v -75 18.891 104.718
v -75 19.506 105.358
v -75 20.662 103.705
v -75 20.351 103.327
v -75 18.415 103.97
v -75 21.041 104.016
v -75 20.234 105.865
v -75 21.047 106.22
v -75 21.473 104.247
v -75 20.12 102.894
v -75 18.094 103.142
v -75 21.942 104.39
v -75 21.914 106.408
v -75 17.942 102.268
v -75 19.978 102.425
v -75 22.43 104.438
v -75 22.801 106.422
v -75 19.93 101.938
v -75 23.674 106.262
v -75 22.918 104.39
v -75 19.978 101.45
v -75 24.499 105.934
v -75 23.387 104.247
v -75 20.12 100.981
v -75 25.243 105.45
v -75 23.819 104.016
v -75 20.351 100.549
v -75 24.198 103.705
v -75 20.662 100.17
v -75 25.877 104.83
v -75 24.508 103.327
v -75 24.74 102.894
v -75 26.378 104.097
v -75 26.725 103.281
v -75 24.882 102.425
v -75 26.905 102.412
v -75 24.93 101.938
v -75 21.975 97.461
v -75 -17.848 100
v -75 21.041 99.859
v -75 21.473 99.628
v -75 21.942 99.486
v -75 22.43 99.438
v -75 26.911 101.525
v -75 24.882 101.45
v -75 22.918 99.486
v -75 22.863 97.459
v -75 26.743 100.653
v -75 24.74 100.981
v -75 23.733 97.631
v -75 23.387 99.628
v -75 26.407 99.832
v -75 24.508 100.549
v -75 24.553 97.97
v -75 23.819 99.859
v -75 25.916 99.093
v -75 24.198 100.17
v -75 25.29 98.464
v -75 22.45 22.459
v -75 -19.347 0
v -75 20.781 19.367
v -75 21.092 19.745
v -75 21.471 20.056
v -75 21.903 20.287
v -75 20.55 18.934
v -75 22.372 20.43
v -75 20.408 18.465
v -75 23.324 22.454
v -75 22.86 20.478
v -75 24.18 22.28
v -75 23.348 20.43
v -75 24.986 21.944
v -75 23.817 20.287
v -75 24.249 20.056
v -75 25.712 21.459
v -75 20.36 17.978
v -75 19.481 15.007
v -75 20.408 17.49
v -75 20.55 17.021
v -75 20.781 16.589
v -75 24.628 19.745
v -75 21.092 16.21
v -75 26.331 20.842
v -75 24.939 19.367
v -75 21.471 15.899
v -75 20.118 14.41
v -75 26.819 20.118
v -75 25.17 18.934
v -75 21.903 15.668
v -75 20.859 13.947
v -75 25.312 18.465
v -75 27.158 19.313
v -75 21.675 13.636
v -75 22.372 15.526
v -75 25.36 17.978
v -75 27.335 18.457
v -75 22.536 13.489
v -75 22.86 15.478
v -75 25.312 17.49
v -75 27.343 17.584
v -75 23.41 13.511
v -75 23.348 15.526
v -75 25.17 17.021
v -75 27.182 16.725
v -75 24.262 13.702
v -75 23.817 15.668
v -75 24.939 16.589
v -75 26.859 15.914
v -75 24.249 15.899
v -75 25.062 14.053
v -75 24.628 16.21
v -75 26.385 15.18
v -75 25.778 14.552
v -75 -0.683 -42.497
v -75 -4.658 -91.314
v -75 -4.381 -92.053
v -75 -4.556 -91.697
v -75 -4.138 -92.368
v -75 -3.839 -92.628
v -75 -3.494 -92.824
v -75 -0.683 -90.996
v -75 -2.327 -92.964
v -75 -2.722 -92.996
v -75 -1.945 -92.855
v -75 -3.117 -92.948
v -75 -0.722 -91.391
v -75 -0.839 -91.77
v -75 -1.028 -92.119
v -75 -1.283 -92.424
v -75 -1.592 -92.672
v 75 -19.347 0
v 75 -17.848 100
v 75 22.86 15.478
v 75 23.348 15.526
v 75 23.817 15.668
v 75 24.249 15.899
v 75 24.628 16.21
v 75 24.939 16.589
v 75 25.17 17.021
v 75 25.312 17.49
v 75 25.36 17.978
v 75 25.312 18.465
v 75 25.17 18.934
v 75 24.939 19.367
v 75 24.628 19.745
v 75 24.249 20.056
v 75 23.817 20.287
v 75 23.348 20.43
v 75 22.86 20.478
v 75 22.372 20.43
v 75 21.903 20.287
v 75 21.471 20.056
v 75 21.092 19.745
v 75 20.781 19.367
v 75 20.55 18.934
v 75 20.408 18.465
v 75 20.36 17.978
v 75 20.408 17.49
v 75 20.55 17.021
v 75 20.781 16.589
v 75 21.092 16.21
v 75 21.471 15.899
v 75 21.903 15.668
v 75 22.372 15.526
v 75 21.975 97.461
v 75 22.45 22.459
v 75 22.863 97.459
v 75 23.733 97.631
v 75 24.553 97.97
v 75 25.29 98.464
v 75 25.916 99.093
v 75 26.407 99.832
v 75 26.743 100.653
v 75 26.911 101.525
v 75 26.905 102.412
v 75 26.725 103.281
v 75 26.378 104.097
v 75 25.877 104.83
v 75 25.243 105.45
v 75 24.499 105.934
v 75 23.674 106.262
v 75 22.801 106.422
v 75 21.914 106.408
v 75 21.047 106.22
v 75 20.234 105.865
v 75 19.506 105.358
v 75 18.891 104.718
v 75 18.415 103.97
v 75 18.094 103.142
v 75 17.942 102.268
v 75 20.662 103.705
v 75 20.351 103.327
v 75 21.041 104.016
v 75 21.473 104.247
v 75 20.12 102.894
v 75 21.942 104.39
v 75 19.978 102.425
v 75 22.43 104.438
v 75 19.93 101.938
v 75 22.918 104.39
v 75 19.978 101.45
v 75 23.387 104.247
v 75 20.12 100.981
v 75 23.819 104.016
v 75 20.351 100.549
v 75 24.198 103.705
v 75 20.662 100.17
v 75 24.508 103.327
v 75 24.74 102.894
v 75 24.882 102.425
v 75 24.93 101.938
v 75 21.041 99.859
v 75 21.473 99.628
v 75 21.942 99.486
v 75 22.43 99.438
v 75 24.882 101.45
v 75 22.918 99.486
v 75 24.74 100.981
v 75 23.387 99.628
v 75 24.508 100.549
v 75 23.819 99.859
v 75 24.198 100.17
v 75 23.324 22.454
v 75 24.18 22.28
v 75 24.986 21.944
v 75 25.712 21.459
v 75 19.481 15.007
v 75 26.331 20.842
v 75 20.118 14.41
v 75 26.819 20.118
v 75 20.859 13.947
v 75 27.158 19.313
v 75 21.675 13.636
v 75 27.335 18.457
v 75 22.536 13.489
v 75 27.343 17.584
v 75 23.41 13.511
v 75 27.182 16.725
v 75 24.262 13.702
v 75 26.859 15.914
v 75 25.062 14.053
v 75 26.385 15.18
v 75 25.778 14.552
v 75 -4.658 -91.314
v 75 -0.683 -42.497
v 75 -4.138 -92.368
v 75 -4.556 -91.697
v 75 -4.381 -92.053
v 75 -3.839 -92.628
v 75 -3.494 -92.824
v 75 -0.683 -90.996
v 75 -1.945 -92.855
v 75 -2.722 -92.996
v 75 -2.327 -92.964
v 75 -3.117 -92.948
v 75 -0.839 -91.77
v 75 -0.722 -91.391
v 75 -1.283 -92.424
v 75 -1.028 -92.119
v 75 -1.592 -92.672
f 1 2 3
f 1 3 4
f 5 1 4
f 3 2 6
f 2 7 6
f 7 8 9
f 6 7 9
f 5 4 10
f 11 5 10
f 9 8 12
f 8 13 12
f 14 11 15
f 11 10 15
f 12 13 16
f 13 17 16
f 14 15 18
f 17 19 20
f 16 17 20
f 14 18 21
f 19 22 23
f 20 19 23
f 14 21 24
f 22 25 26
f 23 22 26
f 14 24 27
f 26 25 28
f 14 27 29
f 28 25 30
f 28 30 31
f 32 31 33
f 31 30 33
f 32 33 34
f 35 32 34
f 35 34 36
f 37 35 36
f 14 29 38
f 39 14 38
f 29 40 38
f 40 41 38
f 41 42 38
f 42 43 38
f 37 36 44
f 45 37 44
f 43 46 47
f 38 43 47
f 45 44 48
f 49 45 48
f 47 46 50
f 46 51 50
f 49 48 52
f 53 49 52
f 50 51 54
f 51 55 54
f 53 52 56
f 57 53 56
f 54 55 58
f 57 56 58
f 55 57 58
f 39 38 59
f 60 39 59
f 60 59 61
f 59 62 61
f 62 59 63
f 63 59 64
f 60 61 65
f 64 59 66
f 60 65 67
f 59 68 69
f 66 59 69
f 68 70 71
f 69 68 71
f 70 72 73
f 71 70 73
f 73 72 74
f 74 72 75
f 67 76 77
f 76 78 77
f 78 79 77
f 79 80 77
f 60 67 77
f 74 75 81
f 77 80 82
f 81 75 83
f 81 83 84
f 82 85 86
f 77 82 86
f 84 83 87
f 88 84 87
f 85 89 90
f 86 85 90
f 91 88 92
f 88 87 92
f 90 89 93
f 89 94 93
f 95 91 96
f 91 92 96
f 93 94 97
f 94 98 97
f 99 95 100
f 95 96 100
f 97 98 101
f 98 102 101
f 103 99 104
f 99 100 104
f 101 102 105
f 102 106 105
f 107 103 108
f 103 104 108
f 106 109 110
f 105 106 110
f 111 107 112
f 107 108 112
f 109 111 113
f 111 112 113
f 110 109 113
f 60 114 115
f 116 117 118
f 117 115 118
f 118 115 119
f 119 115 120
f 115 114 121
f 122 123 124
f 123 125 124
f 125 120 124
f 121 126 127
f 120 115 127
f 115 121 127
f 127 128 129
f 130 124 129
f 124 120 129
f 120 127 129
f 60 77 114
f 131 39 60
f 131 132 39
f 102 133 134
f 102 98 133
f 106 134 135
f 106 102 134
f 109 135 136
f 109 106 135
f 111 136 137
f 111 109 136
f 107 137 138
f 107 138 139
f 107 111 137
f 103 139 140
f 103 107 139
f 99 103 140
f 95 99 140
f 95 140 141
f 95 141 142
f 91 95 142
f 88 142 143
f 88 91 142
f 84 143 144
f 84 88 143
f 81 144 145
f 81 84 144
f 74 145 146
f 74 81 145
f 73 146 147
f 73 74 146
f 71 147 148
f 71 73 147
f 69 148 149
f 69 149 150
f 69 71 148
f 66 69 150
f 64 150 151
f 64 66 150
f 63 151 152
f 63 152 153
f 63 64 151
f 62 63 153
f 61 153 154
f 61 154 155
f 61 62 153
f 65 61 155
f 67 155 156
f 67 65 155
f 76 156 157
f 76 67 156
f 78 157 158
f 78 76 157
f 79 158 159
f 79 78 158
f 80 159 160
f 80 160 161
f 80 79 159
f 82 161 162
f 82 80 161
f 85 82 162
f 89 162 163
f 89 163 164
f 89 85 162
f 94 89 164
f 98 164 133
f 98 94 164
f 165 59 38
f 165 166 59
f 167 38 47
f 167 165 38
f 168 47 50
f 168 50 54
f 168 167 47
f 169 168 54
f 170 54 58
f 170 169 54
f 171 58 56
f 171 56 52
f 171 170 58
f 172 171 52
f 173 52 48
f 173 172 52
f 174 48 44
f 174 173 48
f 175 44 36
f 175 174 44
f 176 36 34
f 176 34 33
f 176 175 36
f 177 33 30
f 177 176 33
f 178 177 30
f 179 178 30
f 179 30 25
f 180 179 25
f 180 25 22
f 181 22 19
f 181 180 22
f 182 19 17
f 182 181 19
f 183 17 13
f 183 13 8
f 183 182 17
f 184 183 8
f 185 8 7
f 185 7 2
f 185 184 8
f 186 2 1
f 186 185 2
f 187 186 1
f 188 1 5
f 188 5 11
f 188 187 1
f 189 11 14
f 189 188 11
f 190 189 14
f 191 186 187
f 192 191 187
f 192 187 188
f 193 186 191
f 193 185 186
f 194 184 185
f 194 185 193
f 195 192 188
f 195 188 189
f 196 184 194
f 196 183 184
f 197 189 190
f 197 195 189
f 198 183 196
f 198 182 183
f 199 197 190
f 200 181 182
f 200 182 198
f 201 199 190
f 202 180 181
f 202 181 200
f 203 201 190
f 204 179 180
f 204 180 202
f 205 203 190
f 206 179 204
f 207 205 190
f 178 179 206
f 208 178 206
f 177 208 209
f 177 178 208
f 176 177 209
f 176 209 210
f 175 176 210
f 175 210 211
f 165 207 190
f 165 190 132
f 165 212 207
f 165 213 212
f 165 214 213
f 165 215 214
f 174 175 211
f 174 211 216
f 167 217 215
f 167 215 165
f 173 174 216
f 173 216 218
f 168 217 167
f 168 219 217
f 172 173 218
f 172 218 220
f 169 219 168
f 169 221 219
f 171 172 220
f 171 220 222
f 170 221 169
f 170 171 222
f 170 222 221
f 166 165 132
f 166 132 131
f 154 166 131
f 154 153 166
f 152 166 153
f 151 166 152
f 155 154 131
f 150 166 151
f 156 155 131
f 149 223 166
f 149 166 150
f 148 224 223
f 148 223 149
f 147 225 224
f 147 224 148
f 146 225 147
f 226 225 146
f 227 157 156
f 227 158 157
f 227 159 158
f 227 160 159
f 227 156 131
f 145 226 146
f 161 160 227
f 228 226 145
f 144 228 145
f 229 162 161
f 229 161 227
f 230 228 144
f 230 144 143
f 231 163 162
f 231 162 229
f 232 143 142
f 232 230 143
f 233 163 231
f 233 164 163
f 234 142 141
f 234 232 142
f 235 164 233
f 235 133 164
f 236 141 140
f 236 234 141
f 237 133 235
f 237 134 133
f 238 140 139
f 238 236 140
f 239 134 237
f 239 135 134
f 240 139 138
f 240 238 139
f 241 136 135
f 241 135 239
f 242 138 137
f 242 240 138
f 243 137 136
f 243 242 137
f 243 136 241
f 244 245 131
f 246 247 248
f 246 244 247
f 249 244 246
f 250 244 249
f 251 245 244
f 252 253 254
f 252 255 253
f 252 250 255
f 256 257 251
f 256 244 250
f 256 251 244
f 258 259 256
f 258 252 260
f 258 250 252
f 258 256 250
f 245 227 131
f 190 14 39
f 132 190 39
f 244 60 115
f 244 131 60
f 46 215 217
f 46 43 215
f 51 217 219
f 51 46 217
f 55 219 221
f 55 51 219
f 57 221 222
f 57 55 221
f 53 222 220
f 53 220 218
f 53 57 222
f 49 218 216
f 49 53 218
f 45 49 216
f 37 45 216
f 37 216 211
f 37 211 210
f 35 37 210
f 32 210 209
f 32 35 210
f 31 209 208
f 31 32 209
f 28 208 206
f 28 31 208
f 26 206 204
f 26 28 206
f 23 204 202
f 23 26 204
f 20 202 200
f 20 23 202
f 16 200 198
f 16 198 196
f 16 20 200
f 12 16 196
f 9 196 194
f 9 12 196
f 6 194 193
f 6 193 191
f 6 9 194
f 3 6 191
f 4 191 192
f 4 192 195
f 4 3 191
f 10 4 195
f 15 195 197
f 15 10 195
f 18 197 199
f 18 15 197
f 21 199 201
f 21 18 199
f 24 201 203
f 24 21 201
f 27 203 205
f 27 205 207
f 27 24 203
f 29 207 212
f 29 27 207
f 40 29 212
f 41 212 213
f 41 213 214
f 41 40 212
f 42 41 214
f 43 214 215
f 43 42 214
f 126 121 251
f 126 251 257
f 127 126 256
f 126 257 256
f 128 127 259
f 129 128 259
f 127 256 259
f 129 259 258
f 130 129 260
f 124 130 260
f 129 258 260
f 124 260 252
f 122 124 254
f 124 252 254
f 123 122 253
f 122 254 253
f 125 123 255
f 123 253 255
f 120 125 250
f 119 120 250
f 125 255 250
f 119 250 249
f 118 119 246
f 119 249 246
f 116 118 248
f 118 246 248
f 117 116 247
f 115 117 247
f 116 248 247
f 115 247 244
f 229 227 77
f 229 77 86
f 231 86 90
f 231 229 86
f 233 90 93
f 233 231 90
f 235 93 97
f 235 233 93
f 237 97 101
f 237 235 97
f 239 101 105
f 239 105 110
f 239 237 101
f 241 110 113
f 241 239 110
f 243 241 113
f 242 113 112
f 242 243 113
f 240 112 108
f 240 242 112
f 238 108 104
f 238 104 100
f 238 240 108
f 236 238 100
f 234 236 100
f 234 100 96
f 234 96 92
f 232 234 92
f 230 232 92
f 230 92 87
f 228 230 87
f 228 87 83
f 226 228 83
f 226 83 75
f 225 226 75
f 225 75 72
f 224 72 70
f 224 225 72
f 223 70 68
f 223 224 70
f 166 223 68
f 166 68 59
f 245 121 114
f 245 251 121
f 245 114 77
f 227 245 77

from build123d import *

# Parameters (mm, degrees)
ESBO_O1_R                = 2.5
RESSALTO_EXTRUS_O1_DEPTH = 75
FILETE1_R                = 2


with BuildPart() as part:
    # Esboço1 → Ressalto-extrusão1 (new, symmetric)
    with BuildSketch(Plane(origin=(0, 0, 0), x_dir=(0, 0, -1), z_dir=(1, 0, 0))):
        with BuildLine():
            Line((-100, -17.848056111), (0, -19.347346796))
            Line((0, -19.347346796), (116.020534247, -0.683058506))
            Line((116.020534247, -0.683058506), (42.496745606, -0.683058506))
            Line((42.496745606, -0.683058506), (-15.006508788, 19.480520471))
            ThreePointArc((-15.006508788, 19.480520471), (-16.311915051, 27.040473041), (-22.459012532, 22.450248543))
            Line((-22.459012532, 22.450248543), (-97.460720141, 21.975419182))
            ThreePointArc((-97.460720141, 21.975419182), (-104.830140039, 25.877112836), (-102.267981422, 17.941943889))
            Line((-102.267981422, 17.941943889), (-100, -17.848056111))
        make_face()
        with Locations((-101.937720305, 22.42980837)):
            Circle(ESBO_O1_R, mode=Mode.SUBTRACT)
        with Locations((-17.977720305, 22.860150942)):
            Circle(ESBO_O1_R, mode=Mode.SUBTRACT)
    extrude(amount=RESSALTO_EXTRUS_O1_DEPTH, both=True)

    # Filete1
    filete1_edges = [part.edges().sort_by_distance(p)[0] for p in [
        (0, -0.683058506, -116.020534247),
    ]]
    fillet(filete1_edges, radius=FILETE1_R)


solid = part.part
